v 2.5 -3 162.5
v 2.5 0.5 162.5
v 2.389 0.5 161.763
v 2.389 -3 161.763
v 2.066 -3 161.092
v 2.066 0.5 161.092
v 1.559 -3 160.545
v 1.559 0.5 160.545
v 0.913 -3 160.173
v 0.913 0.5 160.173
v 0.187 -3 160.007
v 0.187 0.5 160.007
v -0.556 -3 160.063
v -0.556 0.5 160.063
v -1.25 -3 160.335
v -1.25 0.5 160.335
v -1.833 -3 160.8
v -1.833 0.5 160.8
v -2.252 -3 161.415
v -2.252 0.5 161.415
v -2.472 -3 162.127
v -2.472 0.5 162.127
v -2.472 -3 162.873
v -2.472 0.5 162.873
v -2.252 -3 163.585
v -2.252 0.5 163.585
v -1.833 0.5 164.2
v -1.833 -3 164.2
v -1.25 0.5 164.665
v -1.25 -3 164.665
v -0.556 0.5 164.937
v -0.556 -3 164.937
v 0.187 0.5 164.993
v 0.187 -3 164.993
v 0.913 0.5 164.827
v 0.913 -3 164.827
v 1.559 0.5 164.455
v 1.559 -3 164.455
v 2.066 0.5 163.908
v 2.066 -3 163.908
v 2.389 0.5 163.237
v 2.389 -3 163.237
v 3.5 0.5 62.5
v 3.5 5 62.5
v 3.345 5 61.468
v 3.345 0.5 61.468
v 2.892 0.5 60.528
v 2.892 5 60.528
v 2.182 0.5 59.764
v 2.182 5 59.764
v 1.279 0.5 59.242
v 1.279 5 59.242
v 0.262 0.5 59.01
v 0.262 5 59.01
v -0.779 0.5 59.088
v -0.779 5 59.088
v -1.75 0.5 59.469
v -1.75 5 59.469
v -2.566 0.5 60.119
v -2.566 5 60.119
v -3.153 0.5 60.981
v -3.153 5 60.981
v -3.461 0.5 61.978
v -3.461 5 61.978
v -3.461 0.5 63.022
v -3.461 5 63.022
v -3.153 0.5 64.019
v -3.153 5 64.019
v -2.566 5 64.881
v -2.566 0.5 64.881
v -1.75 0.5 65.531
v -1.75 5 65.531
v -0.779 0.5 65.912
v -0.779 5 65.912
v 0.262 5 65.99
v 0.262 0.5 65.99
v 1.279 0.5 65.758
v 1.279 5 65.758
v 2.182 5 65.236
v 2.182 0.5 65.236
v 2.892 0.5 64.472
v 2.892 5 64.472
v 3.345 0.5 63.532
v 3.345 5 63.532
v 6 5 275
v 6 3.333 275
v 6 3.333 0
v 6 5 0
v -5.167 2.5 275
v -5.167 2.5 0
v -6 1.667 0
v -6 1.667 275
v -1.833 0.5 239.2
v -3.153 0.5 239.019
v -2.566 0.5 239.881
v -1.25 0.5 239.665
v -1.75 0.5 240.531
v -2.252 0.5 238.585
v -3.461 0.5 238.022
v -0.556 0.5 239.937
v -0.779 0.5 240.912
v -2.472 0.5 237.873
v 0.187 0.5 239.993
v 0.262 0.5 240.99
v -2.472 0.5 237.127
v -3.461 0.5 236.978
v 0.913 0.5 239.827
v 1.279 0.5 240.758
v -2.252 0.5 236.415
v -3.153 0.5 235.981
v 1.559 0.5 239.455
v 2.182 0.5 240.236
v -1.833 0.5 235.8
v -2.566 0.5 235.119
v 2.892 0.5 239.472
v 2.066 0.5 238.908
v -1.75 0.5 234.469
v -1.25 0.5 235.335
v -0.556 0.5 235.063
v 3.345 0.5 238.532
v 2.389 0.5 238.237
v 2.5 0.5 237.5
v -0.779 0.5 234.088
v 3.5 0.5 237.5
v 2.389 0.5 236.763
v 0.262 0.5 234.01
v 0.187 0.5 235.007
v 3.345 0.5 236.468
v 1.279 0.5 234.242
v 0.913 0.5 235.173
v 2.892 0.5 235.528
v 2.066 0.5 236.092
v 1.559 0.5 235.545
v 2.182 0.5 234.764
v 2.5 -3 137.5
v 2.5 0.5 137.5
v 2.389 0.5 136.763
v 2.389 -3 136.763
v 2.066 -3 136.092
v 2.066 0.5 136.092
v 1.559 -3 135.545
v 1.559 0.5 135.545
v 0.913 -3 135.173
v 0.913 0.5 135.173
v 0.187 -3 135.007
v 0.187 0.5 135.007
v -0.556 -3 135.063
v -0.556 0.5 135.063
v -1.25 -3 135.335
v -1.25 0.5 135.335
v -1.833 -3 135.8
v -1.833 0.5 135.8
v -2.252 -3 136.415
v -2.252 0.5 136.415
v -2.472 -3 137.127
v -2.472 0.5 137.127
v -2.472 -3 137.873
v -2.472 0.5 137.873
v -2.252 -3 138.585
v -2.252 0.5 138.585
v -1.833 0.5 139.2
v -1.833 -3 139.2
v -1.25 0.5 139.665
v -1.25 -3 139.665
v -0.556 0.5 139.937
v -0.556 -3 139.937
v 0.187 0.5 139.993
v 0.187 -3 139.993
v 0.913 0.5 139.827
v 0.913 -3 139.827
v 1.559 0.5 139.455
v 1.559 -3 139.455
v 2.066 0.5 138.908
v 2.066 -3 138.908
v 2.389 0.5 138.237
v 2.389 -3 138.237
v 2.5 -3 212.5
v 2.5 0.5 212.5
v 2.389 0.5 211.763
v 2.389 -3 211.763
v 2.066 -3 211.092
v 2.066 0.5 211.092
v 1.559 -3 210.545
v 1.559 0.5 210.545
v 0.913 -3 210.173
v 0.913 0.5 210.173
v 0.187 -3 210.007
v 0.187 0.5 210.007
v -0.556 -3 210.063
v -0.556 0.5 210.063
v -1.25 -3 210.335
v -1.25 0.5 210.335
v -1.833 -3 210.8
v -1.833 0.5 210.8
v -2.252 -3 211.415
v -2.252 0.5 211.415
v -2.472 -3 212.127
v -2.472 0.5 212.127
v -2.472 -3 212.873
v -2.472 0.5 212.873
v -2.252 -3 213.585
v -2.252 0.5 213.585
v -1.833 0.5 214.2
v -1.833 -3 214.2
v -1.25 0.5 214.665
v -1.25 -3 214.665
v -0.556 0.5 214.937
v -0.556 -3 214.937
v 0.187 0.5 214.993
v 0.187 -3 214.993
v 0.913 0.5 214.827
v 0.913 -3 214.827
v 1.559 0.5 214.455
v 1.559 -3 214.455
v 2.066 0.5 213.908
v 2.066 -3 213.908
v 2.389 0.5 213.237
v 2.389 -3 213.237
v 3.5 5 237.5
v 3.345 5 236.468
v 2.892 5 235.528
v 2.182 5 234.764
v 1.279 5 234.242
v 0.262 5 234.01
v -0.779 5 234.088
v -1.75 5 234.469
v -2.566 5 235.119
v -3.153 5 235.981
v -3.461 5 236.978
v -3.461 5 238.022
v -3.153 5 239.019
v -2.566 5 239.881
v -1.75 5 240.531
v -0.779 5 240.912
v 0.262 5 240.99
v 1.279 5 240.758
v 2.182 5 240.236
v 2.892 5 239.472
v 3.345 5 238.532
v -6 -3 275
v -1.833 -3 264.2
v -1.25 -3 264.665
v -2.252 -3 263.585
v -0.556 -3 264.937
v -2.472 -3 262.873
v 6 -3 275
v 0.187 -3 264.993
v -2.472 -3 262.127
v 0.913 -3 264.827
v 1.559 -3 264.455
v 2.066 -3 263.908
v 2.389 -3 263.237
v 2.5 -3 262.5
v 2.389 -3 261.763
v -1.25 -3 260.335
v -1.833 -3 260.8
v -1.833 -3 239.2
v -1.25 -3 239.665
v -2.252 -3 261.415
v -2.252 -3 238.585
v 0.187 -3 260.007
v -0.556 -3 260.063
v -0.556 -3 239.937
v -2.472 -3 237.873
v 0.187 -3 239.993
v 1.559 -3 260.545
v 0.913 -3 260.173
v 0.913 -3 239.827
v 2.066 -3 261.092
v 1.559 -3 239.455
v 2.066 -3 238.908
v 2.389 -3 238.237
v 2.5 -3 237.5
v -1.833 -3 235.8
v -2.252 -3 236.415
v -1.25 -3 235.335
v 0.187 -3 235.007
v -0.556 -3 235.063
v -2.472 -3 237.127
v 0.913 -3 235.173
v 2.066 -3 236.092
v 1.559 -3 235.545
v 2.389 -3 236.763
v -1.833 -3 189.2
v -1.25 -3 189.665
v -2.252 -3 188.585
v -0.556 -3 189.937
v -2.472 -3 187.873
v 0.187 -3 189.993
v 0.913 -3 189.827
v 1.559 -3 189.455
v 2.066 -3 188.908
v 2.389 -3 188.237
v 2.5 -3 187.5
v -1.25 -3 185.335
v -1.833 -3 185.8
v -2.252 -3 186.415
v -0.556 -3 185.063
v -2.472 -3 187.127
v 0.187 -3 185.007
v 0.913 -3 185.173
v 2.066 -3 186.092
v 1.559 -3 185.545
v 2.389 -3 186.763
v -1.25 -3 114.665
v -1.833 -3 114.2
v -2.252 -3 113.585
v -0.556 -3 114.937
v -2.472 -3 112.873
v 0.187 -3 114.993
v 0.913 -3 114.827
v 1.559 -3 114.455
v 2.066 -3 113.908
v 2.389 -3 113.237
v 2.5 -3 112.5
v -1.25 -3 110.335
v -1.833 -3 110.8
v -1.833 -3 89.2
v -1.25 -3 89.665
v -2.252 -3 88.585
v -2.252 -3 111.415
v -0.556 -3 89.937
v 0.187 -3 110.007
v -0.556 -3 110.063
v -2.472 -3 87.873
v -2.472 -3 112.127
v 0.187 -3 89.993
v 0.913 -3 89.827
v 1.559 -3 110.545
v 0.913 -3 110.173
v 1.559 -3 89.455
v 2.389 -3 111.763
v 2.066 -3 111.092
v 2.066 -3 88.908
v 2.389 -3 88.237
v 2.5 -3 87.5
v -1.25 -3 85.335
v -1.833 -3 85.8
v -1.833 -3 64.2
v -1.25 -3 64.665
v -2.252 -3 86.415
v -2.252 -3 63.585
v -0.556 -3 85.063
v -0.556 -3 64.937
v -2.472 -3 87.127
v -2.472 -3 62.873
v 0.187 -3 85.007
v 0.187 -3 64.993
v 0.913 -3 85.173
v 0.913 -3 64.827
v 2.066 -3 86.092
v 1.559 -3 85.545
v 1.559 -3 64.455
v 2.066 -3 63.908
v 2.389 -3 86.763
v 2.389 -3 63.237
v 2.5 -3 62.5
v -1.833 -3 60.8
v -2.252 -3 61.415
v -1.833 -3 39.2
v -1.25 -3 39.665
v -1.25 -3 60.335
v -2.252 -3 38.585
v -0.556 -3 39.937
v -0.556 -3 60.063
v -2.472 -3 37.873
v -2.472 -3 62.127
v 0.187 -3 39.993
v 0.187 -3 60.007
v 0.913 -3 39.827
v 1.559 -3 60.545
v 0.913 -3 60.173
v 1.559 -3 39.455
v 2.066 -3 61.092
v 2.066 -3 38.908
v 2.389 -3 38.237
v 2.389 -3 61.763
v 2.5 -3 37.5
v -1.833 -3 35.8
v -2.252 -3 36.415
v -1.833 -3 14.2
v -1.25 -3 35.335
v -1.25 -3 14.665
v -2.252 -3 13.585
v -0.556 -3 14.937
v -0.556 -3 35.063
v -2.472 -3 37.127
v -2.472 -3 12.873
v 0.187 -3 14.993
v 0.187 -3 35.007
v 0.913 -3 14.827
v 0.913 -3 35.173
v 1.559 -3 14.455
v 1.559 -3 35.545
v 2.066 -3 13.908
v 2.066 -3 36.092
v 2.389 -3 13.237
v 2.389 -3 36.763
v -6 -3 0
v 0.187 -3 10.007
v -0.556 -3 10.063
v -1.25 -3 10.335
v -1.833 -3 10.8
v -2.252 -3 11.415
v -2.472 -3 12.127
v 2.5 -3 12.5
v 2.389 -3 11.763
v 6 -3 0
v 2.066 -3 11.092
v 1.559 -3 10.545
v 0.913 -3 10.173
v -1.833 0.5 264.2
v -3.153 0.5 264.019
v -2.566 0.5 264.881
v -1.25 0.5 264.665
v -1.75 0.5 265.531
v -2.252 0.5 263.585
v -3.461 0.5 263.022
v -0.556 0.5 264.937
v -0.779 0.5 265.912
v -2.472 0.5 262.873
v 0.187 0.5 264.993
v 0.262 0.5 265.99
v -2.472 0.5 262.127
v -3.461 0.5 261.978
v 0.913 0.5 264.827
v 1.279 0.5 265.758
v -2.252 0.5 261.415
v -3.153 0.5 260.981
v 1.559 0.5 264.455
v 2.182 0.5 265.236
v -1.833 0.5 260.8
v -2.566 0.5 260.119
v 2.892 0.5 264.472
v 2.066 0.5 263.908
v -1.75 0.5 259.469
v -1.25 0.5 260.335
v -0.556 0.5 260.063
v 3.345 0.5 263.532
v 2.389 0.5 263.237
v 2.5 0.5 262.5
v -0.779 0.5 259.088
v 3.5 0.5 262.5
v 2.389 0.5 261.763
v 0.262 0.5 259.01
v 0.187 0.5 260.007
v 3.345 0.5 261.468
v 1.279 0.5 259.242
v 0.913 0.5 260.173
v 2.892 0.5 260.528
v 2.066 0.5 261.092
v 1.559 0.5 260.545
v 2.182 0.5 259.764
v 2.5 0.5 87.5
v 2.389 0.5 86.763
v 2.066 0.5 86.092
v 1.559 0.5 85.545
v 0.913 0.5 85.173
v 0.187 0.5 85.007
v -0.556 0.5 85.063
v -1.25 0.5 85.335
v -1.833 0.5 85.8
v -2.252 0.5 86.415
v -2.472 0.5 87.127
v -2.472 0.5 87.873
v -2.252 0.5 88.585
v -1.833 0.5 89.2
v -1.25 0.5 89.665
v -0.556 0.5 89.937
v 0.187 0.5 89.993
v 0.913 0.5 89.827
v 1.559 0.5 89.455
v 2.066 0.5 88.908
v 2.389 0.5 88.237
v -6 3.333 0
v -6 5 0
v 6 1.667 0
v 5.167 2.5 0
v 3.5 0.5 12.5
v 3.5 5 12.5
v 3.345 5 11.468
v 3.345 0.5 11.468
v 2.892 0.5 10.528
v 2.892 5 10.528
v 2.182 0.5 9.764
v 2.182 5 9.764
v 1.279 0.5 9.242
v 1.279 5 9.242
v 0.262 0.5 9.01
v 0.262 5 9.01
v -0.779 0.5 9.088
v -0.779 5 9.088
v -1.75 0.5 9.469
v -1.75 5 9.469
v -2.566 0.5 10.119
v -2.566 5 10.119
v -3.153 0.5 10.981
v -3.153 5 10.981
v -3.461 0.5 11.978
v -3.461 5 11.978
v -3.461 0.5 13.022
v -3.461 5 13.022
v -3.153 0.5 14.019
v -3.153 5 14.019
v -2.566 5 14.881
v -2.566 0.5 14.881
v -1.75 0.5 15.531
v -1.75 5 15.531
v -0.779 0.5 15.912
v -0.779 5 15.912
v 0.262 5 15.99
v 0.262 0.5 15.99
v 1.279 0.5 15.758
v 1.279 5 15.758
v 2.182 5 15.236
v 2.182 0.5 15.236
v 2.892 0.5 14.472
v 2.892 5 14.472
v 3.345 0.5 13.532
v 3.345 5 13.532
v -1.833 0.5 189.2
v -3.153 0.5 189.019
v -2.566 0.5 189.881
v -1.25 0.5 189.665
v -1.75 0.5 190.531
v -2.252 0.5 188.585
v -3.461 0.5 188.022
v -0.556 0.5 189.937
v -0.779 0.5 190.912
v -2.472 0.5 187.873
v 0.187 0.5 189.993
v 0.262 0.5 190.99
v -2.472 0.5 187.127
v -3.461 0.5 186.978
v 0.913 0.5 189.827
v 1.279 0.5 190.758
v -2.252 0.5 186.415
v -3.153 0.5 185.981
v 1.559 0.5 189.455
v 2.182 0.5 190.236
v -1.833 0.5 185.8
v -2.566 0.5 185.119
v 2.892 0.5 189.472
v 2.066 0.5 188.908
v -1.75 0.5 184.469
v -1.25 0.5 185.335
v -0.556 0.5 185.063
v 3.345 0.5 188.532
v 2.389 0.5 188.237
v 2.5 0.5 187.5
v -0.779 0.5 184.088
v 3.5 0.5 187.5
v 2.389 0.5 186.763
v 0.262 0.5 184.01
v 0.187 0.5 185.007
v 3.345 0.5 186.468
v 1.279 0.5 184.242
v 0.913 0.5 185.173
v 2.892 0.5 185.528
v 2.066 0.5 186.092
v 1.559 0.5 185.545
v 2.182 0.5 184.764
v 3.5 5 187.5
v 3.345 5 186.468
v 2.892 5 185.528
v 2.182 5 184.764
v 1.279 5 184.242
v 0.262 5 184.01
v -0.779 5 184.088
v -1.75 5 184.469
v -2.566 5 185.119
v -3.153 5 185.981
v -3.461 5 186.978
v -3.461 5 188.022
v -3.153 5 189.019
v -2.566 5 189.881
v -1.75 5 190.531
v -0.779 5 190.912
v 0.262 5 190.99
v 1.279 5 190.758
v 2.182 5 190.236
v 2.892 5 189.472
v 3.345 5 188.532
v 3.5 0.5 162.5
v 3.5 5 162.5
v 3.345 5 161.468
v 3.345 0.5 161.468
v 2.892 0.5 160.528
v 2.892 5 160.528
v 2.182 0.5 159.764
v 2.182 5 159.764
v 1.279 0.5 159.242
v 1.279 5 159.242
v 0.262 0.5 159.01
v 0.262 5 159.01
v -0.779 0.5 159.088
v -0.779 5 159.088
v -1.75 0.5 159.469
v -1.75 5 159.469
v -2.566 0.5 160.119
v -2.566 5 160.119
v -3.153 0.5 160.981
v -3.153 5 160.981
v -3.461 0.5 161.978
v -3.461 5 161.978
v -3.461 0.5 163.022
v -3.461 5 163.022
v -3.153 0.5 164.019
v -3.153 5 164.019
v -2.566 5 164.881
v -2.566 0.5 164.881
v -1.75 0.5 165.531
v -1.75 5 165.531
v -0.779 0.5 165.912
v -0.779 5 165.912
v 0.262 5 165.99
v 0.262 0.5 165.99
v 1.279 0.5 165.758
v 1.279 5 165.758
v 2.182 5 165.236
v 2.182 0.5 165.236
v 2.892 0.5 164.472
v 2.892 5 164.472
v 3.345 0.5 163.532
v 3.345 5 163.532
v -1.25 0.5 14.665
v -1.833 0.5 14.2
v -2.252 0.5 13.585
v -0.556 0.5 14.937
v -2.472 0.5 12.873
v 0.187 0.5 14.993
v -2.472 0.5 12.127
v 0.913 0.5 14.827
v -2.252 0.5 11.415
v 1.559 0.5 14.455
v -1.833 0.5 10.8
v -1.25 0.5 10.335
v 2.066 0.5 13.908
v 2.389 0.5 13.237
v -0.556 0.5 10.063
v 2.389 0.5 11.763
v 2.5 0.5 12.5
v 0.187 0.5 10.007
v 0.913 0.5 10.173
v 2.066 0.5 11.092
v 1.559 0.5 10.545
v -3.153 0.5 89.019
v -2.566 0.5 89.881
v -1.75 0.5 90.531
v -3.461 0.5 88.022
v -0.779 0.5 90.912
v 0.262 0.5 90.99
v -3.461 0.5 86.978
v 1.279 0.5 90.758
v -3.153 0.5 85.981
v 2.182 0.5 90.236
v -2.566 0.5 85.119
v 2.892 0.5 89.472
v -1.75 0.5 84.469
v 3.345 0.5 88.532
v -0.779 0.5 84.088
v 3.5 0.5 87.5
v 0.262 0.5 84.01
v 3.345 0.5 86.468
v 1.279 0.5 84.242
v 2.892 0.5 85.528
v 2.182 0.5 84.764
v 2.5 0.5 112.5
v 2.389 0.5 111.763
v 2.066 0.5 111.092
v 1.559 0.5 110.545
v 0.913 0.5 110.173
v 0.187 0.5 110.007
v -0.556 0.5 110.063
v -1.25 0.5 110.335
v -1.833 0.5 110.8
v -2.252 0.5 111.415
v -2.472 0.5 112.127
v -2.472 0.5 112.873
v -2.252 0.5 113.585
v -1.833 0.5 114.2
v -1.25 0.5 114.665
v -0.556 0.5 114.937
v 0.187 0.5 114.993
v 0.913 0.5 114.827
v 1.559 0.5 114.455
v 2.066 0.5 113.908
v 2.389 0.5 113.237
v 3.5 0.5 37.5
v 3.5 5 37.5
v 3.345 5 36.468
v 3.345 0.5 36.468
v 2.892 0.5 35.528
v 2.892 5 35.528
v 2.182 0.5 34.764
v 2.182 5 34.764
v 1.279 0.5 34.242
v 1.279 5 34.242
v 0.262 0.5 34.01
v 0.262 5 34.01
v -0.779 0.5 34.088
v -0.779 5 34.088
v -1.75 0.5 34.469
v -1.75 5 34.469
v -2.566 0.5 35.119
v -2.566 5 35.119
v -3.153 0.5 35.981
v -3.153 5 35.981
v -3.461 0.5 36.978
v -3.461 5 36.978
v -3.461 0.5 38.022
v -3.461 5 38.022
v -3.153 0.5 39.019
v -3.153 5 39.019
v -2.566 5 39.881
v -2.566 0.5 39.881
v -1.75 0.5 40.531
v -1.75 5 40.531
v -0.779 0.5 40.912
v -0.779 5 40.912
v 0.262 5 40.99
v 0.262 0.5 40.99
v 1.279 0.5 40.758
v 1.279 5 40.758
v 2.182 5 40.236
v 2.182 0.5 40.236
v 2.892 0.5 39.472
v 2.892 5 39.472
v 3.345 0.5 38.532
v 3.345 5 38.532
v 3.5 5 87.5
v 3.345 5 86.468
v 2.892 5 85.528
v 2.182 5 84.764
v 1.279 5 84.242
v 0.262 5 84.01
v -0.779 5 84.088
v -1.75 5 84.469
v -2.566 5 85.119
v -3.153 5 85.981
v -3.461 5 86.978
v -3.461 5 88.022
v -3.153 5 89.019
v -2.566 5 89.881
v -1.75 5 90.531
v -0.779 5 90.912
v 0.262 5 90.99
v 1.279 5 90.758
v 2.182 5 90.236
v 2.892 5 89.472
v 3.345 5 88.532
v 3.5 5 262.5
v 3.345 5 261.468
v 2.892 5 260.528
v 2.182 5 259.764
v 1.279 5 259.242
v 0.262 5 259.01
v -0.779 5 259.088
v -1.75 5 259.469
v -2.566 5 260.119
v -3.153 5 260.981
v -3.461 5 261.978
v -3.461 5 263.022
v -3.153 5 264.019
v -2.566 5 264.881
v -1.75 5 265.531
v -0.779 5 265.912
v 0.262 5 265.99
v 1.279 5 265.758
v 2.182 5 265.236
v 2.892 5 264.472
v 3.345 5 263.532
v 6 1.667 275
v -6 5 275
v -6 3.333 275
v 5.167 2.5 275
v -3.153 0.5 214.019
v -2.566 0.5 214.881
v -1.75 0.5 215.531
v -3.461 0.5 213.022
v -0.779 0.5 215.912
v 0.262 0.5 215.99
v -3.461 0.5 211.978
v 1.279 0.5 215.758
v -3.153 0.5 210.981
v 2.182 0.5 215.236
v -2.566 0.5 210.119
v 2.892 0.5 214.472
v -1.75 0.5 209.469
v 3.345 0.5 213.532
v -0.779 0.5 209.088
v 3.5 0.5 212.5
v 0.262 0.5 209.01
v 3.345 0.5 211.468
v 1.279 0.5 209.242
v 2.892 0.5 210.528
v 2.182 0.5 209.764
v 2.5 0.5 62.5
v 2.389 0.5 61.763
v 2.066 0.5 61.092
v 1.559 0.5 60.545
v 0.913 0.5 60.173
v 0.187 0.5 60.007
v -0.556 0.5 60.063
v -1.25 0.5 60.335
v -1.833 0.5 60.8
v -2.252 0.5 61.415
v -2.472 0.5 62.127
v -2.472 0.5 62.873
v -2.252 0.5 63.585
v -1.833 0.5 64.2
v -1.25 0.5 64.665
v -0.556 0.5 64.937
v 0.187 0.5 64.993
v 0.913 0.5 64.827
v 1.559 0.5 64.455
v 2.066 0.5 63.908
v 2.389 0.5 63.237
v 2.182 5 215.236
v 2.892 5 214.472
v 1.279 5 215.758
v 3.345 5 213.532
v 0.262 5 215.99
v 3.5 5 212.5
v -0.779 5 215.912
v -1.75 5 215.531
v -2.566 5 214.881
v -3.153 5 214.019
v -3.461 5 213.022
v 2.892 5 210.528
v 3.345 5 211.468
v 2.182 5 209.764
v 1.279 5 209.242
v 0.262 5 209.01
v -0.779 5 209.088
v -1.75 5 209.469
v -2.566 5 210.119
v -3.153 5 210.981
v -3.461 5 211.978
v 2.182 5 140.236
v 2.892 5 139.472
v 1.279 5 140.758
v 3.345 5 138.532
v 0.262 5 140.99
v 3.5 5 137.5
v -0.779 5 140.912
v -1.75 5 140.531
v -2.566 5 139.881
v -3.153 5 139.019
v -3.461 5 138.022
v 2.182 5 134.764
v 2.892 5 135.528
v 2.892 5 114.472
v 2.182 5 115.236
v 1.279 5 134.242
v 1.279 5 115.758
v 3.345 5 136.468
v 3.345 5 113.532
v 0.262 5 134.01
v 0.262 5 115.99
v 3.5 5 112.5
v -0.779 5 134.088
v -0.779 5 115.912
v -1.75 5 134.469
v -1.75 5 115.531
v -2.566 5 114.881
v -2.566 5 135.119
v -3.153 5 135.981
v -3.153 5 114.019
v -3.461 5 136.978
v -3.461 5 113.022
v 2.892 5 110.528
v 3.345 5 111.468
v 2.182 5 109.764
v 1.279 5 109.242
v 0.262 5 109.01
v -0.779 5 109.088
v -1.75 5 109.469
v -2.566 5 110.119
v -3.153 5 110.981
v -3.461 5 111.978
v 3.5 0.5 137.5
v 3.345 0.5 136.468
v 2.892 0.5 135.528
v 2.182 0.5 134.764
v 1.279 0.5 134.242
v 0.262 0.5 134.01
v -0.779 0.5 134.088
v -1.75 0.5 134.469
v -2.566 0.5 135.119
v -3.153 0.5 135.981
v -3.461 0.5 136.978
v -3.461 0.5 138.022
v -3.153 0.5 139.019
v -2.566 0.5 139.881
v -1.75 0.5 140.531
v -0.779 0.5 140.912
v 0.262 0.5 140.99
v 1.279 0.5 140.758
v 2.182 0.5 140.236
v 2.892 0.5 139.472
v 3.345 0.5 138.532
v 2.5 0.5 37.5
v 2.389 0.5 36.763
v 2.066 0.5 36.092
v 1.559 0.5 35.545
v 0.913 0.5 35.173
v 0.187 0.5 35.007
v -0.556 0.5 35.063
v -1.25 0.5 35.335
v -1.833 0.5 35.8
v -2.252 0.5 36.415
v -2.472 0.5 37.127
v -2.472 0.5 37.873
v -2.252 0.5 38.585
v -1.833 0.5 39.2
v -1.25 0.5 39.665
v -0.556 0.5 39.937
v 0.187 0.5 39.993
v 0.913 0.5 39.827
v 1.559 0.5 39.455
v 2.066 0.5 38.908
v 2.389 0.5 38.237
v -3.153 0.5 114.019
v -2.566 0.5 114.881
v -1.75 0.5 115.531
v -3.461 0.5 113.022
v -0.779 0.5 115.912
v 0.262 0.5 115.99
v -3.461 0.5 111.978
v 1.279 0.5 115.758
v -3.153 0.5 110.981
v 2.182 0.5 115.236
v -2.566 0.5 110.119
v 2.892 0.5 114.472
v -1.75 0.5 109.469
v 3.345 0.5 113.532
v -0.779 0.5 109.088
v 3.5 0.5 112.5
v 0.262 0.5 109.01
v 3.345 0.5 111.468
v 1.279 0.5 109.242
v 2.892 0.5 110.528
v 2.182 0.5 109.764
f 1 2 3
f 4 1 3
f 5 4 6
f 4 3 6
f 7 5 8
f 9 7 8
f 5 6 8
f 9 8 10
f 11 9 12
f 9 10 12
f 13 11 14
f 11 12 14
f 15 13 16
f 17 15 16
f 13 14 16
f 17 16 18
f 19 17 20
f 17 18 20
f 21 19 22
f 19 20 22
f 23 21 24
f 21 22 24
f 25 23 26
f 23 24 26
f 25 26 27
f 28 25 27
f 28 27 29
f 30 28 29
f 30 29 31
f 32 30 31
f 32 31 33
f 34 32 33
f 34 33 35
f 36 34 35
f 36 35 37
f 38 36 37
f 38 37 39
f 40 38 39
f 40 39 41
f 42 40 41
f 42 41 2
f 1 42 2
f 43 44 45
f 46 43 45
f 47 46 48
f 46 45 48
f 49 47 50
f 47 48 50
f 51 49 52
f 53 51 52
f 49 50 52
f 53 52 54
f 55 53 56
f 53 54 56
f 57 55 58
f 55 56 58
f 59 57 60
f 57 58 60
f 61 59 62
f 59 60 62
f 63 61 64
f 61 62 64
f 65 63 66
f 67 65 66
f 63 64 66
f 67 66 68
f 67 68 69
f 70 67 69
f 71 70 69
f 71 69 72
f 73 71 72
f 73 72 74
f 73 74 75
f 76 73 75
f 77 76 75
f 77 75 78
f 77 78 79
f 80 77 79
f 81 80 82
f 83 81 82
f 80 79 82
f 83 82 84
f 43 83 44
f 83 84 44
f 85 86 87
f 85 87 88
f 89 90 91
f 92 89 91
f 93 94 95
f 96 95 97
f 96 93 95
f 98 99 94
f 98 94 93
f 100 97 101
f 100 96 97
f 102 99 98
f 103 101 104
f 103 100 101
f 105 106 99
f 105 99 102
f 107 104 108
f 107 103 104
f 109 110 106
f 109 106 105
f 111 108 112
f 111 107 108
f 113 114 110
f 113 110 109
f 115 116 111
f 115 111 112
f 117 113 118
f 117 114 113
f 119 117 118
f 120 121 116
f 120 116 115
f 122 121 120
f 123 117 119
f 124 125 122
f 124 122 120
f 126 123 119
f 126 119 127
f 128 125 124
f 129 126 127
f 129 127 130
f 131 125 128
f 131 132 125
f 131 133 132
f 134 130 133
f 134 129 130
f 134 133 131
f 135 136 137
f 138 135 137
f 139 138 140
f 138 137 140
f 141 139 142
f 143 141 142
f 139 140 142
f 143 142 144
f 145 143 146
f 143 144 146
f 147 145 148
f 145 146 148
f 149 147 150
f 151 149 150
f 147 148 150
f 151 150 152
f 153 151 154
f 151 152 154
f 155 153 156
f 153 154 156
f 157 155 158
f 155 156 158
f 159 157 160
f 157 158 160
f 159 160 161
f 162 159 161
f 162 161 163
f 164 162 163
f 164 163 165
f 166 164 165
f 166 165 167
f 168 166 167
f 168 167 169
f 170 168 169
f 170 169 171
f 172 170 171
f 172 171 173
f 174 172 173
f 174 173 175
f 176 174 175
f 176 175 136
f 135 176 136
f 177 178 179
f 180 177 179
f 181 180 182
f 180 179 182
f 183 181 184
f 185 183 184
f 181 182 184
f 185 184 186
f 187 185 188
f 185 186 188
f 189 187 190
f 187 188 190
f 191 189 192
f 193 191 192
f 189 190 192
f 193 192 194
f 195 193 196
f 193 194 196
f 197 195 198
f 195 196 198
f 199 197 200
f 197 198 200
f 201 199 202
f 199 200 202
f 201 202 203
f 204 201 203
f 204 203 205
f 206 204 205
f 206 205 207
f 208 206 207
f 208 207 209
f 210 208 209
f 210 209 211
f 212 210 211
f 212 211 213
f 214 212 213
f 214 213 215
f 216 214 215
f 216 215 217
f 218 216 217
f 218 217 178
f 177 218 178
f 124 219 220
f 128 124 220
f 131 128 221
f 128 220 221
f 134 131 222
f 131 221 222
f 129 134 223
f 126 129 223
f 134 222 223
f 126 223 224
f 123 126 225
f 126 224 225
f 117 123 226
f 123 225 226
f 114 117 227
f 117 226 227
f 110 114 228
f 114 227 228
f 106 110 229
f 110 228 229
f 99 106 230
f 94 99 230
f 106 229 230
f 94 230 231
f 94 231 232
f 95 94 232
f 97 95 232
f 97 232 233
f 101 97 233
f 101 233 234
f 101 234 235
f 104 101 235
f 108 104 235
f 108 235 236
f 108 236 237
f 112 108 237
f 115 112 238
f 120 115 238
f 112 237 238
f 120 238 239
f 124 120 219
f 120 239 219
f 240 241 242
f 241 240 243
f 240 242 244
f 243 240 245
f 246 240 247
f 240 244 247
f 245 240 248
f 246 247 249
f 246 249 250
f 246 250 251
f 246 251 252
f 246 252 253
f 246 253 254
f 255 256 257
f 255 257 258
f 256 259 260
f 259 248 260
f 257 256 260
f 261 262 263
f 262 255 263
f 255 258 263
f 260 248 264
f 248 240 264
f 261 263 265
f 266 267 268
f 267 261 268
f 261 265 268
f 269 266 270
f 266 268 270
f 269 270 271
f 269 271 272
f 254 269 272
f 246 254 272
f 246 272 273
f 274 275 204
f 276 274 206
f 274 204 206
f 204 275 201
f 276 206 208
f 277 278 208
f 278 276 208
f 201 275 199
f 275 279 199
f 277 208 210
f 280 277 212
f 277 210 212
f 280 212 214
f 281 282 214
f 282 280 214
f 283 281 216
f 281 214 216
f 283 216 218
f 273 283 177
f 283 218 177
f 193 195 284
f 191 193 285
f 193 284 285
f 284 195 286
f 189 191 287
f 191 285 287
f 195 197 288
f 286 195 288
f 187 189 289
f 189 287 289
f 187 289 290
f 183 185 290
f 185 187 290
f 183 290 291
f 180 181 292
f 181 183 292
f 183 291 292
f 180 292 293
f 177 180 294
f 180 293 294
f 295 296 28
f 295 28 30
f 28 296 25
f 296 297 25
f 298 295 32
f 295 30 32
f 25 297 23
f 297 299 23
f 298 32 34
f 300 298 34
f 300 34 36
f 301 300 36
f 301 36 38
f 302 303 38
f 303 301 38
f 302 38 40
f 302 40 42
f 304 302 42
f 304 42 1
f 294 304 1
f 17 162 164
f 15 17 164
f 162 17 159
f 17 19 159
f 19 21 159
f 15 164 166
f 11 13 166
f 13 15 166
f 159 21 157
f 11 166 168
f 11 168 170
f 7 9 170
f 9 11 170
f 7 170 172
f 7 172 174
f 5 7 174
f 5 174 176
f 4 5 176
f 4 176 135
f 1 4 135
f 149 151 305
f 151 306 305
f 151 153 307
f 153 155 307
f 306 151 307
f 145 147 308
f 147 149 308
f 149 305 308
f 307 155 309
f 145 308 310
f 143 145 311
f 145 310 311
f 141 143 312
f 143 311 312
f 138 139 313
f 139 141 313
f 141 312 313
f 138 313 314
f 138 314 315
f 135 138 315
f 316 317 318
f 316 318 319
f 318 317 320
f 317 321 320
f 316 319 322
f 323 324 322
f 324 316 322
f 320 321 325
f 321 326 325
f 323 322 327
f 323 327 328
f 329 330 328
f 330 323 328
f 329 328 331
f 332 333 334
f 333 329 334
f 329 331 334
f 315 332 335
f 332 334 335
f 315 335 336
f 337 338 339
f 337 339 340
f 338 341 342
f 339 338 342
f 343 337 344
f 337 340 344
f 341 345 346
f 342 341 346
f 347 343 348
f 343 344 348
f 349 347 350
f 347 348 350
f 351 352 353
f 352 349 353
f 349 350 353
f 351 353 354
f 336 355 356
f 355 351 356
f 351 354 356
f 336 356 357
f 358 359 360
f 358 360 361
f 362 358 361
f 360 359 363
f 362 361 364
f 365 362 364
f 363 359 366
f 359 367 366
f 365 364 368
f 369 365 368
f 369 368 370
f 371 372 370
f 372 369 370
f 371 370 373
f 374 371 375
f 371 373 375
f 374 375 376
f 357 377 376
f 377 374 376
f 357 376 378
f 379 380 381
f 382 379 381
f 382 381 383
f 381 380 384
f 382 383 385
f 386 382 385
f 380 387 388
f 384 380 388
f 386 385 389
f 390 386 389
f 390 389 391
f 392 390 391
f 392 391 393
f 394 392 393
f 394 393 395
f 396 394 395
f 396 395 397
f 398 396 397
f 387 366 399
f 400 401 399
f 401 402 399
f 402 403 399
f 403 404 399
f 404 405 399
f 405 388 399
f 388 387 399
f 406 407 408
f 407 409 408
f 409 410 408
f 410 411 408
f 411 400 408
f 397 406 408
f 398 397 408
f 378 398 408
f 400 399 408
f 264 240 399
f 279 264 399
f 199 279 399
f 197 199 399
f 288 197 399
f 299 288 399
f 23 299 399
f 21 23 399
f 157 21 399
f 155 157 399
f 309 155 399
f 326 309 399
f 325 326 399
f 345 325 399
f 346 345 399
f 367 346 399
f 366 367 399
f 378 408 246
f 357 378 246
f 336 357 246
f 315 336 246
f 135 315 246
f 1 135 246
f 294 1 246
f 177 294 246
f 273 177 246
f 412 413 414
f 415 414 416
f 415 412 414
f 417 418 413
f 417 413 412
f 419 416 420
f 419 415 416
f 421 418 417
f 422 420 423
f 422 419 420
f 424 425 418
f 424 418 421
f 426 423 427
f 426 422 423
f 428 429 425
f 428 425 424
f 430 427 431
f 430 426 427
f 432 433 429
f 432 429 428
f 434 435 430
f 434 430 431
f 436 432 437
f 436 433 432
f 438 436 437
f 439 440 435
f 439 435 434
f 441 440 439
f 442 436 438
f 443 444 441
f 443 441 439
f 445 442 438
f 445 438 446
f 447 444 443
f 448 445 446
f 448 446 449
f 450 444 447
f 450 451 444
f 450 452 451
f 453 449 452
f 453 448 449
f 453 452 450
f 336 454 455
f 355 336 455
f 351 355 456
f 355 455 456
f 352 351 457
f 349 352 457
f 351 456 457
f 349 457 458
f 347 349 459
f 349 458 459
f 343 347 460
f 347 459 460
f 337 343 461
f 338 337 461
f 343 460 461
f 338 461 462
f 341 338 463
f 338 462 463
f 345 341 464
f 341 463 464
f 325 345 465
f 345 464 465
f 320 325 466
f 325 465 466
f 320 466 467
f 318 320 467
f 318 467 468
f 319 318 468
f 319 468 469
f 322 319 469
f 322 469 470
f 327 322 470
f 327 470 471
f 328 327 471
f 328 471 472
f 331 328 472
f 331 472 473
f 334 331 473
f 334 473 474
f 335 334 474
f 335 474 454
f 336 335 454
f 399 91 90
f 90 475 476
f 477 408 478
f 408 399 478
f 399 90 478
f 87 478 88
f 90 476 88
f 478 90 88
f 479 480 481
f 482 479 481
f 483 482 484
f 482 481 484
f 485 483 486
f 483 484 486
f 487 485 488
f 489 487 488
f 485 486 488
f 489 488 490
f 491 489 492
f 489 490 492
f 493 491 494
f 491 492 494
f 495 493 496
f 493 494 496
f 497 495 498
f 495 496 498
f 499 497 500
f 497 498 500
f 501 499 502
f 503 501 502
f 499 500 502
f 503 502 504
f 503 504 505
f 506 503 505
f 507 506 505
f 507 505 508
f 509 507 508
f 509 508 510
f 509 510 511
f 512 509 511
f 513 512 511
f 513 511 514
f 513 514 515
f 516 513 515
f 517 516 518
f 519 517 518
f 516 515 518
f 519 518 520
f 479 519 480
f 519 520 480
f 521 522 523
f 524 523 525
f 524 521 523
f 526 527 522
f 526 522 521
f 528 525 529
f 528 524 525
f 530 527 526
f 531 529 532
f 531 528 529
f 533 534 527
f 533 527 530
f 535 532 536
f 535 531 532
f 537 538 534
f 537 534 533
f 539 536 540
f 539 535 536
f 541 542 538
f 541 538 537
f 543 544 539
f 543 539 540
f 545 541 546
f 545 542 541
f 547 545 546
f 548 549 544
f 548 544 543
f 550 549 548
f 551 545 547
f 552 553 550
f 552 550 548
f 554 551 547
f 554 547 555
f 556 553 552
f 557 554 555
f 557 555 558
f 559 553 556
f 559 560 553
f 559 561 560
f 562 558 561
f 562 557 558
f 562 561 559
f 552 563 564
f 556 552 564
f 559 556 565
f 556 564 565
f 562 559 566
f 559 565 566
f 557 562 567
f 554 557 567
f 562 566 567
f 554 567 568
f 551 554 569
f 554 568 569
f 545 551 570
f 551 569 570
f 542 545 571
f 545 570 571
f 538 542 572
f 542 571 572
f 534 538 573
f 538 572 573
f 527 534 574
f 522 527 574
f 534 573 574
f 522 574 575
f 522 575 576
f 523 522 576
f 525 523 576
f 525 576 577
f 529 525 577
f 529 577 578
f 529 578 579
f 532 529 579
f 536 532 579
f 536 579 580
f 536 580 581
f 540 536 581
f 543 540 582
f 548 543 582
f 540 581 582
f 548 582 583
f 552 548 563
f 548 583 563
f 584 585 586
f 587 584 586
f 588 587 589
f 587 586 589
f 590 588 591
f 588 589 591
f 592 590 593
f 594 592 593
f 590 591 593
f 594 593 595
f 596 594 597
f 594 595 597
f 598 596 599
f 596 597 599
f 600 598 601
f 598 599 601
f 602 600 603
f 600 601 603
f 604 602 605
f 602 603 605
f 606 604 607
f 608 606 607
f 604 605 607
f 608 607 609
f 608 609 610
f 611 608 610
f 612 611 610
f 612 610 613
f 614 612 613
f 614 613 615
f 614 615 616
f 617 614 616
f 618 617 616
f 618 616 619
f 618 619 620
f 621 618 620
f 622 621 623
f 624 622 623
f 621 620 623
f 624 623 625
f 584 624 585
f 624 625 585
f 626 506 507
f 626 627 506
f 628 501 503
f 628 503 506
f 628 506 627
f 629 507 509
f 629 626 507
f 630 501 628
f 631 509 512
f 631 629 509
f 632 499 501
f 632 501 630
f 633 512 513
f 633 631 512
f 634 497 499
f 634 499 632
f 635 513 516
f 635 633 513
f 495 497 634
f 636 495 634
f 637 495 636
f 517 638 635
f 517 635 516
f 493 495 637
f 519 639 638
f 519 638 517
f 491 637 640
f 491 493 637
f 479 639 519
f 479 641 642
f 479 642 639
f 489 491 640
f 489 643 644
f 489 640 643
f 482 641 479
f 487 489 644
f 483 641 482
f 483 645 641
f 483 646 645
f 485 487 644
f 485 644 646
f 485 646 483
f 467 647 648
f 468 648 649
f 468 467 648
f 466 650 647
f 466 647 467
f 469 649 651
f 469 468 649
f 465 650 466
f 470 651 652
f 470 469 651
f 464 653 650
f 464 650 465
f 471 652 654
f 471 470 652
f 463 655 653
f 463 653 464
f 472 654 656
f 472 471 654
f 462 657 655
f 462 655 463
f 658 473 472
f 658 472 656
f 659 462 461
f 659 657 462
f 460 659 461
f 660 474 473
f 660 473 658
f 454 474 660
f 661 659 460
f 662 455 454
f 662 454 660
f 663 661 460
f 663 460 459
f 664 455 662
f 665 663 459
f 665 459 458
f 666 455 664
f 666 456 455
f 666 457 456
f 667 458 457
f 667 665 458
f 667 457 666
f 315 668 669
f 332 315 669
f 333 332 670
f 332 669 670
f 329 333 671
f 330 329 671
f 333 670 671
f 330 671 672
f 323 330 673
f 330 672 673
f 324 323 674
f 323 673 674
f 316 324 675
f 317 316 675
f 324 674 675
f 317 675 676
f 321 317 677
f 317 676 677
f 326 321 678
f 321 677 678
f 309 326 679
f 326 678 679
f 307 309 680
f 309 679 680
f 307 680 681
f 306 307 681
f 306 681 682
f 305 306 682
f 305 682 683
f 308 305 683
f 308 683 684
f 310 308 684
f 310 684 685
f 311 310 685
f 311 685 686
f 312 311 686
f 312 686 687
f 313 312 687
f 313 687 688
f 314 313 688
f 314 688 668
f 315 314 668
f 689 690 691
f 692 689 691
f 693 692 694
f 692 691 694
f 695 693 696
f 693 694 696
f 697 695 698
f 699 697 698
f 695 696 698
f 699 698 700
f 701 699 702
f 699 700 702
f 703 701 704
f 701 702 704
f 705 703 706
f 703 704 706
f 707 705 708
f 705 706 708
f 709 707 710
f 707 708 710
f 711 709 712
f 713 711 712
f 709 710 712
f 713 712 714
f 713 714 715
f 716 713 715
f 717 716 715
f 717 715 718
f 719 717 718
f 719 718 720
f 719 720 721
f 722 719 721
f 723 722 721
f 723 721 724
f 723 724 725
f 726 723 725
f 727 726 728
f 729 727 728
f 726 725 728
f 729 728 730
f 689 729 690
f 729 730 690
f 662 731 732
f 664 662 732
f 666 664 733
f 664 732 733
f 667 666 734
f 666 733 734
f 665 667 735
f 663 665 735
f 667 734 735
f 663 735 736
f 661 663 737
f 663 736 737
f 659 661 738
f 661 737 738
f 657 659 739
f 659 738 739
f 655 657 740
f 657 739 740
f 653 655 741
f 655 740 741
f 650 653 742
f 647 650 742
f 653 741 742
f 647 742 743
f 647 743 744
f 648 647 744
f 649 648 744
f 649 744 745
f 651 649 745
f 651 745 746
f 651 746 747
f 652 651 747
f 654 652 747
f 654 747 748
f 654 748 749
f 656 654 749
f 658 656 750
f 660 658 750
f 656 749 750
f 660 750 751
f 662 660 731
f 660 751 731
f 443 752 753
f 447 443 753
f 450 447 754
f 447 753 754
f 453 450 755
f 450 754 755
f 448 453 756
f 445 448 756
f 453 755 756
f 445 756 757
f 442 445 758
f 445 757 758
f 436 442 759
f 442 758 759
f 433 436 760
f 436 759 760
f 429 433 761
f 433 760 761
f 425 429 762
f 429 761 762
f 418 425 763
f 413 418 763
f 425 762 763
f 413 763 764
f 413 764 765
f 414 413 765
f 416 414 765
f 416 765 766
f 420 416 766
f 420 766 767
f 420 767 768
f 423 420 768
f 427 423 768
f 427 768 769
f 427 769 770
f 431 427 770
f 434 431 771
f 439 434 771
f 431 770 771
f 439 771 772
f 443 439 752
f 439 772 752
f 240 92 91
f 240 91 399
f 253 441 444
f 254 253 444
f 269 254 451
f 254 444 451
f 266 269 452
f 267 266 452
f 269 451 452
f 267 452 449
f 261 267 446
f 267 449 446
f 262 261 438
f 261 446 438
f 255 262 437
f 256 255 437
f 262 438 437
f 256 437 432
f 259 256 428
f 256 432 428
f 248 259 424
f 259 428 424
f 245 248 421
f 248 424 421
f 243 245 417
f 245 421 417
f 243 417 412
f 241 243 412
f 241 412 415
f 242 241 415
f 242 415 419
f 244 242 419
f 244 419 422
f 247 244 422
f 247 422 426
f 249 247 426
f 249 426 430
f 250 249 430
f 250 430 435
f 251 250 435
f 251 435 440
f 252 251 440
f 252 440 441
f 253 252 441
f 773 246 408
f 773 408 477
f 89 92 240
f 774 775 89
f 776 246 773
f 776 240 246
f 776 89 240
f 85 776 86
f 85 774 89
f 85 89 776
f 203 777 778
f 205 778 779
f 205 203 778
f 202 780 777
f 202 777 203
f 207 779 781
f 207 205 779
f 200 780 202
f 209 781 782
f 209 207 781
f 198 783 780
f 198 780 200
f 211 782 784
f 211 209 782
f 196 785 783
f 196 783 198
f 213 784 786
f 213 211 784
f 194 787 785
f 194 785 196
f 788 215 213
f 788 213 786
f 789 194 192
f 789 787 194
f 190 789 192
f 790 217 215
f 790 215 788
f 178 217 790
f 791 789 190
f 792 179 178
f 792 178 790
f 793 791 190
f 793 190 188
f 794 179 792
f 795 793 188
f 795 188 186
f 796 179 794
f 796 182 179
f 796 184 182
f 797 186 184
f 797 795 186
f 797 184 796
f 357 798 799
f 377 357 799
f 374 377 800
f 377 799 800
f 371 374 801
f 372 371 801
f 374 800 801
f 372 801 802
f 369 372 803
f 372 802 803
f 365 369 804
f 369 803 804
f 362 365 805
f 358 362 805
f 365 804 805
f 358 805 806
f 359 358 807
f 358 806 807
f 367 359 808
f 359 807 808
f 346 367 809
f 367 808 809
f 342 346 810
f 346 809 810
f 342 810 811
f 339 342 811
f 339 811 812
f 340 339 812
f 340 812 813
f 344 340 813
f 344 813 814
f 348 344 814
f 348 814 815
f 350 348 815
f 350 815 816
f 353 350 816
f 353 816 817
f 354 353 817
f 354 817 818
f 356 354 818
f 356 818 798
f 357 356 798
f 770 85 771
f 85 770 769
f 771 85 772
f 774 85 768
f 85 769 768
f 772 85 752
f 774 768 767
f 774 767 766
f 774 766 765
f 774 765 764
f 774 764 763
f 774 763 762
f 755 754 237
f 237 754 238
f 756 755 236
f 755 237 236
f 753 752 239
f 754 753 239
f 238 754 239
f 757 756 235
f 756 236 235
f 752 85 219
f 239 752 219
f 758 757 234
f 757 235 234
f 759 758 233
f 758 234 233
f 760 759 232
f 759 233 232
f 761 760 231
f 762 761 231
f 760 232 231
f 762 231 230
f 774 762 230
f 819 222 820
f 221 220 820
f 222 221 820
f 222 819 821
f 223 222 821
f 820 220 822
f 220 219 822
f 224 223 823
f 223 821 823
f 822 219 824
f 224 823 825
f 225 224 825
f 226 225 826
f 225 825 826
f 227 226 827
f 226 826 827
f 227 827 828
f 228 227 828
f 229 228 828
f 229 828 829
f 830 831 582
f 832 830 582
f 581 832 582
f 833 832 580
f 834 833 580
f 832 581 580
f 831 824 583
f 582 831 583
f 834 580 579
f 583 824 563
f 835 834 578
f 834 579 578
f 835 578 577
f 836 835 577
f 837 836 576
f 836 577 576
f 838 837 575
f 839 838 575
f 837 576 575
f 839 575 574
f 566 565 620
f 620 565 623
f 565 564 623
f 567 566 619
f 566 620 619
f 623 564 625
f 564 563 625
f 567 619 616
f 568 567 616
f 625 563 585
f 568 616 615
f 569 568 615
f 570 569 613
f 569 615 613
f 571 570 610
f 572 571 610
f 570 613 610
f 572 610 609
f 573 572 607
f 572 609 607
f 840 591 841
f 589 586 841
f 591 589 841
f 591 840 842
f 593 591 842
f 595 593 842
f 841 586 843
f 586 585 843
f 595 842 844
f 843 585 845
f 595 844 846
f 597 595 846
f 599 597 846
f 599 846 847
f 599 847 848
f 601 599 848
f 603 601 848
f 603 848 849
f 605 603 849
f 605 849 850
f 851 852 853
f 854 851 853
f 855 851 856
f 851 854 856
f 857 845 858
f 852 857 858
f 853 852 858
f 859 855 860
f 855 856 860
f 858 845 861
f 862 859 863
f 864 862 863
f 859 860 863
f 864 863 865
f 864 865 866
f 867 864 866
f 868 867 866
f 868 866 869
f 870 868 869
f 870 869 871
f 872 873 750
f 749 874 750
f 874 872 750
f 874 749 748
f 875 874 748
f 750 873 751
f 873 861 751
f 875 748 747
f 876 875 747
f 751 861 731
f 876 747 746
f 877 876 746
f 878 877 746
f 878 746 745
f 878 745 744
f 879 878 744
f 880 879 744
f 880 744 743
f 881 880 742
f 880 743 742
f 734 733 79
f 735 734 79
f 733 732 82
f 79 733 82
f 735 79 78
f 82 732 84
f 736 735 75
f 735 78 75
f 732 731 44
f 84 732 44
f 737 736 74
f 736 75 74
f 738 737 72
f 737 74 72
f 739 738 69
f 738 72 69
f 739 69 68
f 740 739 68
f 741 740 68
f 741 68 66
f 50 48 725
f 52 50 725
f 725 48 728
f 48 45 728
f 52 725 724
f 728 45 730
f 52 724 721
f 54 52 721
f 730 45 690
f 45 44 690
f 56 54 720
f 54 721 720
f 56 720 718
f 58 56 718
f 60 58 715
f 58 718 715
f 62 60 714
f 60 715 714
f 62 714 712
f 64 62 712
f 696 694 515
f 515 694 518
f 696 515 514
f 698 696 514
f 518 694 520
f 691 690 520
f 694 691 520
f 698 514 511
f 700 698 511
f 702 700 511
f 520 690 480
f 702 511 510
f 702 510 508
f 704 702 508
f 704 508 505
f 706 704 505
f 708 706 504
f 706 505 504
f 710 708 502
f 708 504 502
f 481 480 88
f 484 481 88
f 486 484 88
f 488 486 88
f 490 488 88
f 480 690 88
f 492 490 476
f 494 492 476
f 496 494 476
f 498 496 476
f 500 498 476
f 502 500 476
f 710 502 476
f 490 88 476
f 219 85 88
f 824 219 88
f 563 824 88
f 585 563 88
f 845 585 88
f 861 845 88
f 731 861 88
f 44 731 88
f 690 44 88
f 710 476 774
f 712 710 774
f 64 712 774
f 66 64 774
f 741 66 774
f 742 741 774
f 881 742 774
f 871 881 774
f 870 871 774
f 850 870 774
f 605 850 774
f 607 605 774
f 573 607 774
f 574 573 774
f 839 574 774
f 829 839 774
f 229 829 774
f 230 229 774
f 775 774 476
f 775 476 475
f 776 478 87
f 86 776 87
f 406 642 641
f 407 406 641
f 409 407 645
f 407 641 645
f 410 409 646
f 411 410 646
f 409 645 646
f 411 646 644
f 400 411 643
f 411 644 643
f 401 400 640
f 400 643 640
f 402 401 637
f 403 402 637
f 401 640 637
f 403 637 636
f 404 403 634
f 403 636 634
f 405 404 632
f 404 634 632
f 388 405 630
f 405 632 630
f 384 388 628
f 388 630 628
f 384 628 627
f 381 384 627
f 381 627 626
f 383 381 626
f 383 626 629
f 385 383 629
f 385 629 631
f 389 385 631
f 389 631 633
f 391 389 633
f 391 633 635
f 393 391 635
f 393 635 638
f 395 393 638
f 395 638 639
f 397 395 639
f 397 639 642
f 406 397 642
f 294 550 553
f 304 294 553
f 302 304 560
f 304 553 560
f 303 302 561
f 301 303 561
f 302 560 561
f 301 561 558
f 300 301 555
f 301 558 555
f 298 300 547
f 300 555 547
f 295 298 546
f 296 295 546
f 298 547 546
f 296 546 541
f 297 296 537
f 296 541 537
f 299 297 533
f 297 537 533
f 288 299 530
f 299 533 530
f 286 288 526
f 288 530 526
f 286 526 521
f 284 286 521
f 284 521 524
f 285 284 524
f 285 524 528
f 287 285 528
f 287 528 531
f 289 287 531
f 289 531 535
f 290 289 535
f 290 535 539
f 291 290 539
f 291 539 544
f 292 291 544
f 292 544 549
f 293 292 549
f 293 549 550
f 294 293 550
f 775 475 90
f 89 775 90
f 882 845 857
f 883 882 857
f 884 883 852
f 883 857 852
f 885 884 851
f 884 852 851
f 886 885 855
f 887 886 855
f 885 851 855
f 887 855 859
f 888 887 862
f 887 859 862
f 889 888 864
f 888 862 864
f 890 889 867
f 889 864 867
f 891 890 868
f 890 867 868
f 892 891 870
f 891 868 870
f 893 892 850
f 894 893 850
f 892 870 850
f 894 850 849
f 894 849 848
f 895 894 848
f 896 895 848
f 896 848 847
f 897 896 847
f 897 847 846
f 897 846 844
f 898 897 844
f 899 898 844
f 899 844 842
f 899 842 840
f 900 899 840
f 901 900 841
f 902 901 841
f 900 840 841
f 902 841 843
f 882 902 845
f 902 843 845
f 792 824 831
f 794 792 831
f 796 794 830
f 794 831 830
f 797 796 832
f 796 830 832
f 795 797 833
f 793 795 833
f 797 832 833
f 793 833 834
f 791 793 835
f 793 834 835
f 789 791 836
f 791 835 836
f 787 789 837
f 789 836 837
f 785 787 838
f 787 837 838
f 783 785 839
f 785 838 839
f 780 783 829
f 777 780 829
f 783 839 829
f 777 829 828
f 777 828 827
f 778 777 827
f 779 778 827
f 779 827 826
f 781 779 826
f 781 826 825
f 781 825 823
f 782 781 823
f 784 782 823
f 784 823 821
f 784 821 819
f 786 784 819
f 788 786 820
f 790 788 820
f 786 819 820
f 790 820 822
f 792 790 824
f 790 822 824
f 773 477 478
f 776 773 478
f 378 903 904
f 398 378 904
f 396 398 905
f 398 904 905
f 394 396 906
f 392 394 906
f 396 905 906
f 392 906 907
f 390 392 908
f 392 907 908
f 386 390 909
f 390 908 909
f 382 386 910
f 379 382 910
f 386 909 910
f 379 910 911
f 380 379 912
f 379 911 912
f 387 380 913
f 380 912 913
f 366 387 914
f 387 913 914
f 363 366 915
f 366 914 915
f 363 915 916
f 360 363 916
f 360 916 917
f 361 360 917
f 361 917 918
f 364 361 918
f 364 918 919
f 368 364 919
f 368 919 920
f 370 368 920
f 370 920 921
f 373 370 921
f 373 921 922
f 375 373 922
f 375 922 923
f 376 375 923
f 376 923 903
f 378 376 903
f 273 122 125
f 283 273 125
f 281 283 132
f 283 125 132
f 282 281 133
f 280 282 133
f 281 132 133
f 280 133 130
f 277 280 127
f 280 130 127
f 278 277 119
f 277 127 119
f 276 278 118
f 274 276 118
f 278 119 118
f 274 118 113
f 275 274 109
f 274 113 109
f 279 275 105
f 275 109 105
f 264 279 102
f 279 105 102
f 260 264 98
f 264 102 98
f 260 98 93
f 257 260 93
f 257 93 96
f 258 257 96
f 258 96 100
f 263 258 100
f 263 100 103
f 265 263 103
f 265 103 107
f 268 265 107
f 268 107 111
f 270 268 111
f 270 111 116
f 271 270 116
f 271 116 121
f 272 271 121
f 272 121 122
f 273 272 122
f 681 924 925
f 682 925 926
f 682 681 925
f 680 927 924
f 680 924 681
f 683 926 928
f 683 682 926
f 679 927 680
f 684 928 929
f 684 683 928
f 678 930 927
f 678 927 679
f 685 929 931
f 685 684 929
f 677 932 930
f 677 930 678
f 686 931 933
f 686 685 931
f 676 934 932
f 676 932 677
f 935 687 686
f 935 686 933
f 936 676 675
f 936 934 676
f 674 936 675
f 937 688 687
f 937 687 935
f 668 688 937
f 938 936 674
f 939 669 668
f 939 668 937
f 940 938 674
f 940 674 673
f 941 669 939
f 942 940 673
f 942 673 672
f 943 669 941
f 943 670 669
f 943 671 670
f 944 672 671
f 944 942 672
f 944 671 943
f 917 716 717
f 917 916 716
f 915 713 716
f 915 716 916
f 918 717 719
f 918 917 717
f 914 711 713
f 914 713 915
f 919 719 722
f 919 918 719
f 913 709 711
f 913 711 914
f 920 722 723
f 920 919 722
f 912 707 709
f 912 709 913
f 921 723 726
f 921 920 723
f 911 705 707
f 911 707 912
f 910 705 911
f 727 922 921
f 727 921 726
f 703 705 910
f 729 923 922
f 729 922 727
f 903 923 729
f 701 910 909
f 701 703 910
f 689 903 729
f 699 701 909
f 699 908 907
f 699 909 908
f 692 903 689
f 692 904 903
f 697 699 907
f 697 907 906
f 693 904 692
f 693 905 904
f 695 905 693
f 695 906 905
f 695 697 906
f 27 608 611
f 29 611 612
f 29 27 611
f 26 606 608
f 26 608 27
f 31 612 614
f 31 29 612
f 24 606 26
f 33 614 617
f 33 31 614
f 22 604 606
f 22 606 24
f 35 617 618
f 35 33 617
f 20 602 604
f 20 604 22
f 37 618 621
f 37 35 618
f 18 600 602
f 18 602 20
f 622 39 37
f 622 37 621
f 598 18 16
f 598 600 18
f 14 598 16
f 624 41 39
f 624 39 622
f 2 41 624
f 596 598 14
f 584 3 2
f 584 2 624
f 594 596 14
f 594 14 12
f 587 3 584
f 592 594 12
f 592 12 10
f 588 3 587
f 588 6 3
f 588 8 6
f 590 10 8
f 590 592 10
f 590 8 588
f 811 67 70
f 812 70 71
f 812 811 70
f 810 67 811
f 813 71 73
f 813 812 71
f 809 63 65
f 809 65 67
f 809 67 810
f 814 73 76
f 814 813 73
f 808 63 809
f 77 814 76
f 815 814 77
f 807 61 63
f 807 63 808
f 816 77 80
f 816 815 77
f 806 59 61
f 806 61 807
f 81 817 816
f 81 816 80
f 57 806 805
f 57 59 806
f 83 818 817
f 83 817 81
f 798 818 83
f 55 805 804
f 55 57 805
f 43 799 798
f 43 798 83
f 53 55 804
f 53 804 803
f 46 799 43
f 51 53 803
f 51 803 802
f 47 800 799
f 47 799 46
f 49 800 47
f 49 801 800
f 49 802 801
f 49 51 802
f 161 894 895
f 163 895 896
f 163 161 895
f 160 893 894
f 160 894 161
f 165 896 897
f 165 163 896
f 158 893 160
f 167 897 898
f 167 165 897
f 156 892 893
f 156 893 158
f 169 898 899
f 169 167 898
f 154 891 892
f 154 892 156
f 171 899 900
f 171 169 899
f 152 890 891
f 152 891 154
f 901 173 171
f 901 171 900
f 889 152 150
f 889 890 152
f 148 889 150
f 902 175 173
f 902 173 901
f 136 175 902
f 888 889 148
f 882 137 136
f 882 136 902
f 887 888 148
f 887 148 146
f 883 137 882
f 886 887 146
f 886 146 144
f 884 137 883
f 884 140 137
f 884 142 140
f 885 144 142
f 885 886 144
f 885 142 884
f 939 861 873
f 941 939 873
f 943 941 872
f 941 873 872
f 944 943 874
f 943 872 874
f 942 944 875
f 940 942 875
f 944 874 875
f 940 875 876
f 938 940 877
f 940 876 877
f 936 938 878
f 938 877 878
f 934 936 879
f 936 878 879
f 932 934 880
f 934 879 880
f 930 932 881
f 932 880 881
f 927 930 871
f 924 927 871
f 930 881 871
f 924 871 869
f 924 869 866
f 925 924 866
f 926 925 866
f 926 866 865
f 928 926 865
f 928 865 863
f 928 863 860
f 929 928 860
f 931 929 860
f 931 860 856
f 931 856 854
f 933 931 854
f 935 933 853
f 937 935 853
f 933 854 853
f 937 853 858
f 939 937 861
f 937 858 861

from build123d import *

# Parameters (mm, degrees)
BOSS_EXTRUDE1_DEPTH = 275
SKETCH2_R           = 2.5
CUT_EXTRUDE1_DEPTH  = 9
SKETCH2_3_R         = 3.5
SKETCH2_3_R_2       = 2.5
CUT_EXTRUDE2_DEPTH  = 4.5


with BuildPart() as part:
    # Sketch1 → Boss-Extrude1 (new body)
    with BuildSketch(Plane.XY):
        Polygon((6, -3), (6, 1.666666667), (5.166666667, 2.5), (6, 3.333333333), (6, 5), (-6, 5), (-6, 3.333333333), (-5.166666667, 2.5), (-6, 1.666666667), (-6, -3), align=None)
    extrude(amount=BOSS_EXTRUDE1_DEPTH)

    # Sketch2 → Cut-Extrude1 (cut, through all)
    with BuildSketch(Plane(origin=(0, 5, 0), x_dir=(1, 0, 0), z_dir=(0, 1, 0))):
        with Locations((0, -12.5)):
            Circle(SKETCH2_R)
        with Locations((0, -262.5)):
            Circle(SKETCH2_R)
        with Locations((0, -137.5)):
            Circle(SKETCH2_R)
        with Locations((0, -37.5)):
            Circle(SKETCH2_R)
        with Locations((0, -62.5)):
            Circle(SKETCH2_R)
        with Locations((0, -87.5)):
            Circle(SKETCH2_R)
        with Locations((0, -112.5)):
            Circle(SKETCH2_R)
        with Locations((0, -162.5)):
            Circle(SKETCH2_R)
        with Locations((0, -187.5)):
            Circle(SKETCH2_R)
        with Locations((0, -212.5)):
            Circle(SKETCH2_R)
        with Locations((0, -237.5)):
            Circle(SKETCH2_R)
    extrude(amount=-CUT_EXTRUDE1_DEPTH, mode=Mode.SUBTRACT)

    # Sketch2<3> → Cut-Extrude2 (cut)
    with BuildSketch(Plane(origin=(0, 5, 0), x_dir=(1, 0, 0), z_dir=(0, 1, 0))):
        with Locations((0, -12.5)):
            Circle(SKETCH2_3_R)
        with Locations((0, -12.5)):
            Circle(SKETCH2_3_R_2, mode=Mode.SUBTRACT)
        with Locations((0, -262.5)):
            Circle(SKETCH2_3_R)
        with Locations((0, -262.5)):
            Circle(SKETCH2_3_R_2, mode=Mode.SUBTRACT)
        with Locations((0, -137.5)):
            Circle(SKETCH2_3_R)
        with Locations((0, -137.5)):
            Circle(SKETCH2_3_R_2, mode=Mode.SUBTRACT)
        with Locations((0, -37.5)):
            Circle(SKETCH2_3_R)
        with Locations((0, -37.5)):
            Circle(SKETCH2_3_R_2, mode=Mode.SUBTRACT)
        with Locations((0, -62.5)):
            Circle(SKETCH2_3_R)
        with Locations((0, -62.5)):
            Circle(SKETCH2_3_R_2, mode=Mode.SUBTRACT)
        with Locations((0, -87.5)):
            Circle(SKETCH2_3_R)
        with Locations((0, -87.5)):
            Circle(SKETCH2_3_R_2, mode=Mode.SUBTRACT)
        with Locations((0, -112.5)):
            Circle(SKETCH2_3_R)
        with Locations((0, -112.5)):
            Circle(SKETCH2_3_R_2, mode=Mode.SUBTRACT)
        with Locations((0, -162.5)):
            Circle(SKETCH2_3_R)
        with Locations((0, -162.5)):
            Circle(SKETCH2_3_R_2, mode=Mode.SUBTRACT)
        with Locations((0, -187.5)):
            Circle(SKETCH2_3_R)
        with Locations((0, -187.5)):
            Circle(SKETCH2_3_R_2, mode=Mode.SUBTRACT)
        with Locations((0, -212.5)):
            Circle(SKETCH2_3_R)
        with Locations((0, -212.5)):
            Circle(SKETCH2_3_R_2, mode=Mode.SUBTRACT)
        with Locations((0, -237.5)):
            Circle(SKETCH2_3_R)
        with Locations((0, -237.5)):
            Circle(SKETCH2_3_R_2, mode=Mode.SUBTRACT)
    extrude(amount=-CUT_EXTRUDE2_DEPTH, mode=Mode.SUBTRACT)


solid = part.part
